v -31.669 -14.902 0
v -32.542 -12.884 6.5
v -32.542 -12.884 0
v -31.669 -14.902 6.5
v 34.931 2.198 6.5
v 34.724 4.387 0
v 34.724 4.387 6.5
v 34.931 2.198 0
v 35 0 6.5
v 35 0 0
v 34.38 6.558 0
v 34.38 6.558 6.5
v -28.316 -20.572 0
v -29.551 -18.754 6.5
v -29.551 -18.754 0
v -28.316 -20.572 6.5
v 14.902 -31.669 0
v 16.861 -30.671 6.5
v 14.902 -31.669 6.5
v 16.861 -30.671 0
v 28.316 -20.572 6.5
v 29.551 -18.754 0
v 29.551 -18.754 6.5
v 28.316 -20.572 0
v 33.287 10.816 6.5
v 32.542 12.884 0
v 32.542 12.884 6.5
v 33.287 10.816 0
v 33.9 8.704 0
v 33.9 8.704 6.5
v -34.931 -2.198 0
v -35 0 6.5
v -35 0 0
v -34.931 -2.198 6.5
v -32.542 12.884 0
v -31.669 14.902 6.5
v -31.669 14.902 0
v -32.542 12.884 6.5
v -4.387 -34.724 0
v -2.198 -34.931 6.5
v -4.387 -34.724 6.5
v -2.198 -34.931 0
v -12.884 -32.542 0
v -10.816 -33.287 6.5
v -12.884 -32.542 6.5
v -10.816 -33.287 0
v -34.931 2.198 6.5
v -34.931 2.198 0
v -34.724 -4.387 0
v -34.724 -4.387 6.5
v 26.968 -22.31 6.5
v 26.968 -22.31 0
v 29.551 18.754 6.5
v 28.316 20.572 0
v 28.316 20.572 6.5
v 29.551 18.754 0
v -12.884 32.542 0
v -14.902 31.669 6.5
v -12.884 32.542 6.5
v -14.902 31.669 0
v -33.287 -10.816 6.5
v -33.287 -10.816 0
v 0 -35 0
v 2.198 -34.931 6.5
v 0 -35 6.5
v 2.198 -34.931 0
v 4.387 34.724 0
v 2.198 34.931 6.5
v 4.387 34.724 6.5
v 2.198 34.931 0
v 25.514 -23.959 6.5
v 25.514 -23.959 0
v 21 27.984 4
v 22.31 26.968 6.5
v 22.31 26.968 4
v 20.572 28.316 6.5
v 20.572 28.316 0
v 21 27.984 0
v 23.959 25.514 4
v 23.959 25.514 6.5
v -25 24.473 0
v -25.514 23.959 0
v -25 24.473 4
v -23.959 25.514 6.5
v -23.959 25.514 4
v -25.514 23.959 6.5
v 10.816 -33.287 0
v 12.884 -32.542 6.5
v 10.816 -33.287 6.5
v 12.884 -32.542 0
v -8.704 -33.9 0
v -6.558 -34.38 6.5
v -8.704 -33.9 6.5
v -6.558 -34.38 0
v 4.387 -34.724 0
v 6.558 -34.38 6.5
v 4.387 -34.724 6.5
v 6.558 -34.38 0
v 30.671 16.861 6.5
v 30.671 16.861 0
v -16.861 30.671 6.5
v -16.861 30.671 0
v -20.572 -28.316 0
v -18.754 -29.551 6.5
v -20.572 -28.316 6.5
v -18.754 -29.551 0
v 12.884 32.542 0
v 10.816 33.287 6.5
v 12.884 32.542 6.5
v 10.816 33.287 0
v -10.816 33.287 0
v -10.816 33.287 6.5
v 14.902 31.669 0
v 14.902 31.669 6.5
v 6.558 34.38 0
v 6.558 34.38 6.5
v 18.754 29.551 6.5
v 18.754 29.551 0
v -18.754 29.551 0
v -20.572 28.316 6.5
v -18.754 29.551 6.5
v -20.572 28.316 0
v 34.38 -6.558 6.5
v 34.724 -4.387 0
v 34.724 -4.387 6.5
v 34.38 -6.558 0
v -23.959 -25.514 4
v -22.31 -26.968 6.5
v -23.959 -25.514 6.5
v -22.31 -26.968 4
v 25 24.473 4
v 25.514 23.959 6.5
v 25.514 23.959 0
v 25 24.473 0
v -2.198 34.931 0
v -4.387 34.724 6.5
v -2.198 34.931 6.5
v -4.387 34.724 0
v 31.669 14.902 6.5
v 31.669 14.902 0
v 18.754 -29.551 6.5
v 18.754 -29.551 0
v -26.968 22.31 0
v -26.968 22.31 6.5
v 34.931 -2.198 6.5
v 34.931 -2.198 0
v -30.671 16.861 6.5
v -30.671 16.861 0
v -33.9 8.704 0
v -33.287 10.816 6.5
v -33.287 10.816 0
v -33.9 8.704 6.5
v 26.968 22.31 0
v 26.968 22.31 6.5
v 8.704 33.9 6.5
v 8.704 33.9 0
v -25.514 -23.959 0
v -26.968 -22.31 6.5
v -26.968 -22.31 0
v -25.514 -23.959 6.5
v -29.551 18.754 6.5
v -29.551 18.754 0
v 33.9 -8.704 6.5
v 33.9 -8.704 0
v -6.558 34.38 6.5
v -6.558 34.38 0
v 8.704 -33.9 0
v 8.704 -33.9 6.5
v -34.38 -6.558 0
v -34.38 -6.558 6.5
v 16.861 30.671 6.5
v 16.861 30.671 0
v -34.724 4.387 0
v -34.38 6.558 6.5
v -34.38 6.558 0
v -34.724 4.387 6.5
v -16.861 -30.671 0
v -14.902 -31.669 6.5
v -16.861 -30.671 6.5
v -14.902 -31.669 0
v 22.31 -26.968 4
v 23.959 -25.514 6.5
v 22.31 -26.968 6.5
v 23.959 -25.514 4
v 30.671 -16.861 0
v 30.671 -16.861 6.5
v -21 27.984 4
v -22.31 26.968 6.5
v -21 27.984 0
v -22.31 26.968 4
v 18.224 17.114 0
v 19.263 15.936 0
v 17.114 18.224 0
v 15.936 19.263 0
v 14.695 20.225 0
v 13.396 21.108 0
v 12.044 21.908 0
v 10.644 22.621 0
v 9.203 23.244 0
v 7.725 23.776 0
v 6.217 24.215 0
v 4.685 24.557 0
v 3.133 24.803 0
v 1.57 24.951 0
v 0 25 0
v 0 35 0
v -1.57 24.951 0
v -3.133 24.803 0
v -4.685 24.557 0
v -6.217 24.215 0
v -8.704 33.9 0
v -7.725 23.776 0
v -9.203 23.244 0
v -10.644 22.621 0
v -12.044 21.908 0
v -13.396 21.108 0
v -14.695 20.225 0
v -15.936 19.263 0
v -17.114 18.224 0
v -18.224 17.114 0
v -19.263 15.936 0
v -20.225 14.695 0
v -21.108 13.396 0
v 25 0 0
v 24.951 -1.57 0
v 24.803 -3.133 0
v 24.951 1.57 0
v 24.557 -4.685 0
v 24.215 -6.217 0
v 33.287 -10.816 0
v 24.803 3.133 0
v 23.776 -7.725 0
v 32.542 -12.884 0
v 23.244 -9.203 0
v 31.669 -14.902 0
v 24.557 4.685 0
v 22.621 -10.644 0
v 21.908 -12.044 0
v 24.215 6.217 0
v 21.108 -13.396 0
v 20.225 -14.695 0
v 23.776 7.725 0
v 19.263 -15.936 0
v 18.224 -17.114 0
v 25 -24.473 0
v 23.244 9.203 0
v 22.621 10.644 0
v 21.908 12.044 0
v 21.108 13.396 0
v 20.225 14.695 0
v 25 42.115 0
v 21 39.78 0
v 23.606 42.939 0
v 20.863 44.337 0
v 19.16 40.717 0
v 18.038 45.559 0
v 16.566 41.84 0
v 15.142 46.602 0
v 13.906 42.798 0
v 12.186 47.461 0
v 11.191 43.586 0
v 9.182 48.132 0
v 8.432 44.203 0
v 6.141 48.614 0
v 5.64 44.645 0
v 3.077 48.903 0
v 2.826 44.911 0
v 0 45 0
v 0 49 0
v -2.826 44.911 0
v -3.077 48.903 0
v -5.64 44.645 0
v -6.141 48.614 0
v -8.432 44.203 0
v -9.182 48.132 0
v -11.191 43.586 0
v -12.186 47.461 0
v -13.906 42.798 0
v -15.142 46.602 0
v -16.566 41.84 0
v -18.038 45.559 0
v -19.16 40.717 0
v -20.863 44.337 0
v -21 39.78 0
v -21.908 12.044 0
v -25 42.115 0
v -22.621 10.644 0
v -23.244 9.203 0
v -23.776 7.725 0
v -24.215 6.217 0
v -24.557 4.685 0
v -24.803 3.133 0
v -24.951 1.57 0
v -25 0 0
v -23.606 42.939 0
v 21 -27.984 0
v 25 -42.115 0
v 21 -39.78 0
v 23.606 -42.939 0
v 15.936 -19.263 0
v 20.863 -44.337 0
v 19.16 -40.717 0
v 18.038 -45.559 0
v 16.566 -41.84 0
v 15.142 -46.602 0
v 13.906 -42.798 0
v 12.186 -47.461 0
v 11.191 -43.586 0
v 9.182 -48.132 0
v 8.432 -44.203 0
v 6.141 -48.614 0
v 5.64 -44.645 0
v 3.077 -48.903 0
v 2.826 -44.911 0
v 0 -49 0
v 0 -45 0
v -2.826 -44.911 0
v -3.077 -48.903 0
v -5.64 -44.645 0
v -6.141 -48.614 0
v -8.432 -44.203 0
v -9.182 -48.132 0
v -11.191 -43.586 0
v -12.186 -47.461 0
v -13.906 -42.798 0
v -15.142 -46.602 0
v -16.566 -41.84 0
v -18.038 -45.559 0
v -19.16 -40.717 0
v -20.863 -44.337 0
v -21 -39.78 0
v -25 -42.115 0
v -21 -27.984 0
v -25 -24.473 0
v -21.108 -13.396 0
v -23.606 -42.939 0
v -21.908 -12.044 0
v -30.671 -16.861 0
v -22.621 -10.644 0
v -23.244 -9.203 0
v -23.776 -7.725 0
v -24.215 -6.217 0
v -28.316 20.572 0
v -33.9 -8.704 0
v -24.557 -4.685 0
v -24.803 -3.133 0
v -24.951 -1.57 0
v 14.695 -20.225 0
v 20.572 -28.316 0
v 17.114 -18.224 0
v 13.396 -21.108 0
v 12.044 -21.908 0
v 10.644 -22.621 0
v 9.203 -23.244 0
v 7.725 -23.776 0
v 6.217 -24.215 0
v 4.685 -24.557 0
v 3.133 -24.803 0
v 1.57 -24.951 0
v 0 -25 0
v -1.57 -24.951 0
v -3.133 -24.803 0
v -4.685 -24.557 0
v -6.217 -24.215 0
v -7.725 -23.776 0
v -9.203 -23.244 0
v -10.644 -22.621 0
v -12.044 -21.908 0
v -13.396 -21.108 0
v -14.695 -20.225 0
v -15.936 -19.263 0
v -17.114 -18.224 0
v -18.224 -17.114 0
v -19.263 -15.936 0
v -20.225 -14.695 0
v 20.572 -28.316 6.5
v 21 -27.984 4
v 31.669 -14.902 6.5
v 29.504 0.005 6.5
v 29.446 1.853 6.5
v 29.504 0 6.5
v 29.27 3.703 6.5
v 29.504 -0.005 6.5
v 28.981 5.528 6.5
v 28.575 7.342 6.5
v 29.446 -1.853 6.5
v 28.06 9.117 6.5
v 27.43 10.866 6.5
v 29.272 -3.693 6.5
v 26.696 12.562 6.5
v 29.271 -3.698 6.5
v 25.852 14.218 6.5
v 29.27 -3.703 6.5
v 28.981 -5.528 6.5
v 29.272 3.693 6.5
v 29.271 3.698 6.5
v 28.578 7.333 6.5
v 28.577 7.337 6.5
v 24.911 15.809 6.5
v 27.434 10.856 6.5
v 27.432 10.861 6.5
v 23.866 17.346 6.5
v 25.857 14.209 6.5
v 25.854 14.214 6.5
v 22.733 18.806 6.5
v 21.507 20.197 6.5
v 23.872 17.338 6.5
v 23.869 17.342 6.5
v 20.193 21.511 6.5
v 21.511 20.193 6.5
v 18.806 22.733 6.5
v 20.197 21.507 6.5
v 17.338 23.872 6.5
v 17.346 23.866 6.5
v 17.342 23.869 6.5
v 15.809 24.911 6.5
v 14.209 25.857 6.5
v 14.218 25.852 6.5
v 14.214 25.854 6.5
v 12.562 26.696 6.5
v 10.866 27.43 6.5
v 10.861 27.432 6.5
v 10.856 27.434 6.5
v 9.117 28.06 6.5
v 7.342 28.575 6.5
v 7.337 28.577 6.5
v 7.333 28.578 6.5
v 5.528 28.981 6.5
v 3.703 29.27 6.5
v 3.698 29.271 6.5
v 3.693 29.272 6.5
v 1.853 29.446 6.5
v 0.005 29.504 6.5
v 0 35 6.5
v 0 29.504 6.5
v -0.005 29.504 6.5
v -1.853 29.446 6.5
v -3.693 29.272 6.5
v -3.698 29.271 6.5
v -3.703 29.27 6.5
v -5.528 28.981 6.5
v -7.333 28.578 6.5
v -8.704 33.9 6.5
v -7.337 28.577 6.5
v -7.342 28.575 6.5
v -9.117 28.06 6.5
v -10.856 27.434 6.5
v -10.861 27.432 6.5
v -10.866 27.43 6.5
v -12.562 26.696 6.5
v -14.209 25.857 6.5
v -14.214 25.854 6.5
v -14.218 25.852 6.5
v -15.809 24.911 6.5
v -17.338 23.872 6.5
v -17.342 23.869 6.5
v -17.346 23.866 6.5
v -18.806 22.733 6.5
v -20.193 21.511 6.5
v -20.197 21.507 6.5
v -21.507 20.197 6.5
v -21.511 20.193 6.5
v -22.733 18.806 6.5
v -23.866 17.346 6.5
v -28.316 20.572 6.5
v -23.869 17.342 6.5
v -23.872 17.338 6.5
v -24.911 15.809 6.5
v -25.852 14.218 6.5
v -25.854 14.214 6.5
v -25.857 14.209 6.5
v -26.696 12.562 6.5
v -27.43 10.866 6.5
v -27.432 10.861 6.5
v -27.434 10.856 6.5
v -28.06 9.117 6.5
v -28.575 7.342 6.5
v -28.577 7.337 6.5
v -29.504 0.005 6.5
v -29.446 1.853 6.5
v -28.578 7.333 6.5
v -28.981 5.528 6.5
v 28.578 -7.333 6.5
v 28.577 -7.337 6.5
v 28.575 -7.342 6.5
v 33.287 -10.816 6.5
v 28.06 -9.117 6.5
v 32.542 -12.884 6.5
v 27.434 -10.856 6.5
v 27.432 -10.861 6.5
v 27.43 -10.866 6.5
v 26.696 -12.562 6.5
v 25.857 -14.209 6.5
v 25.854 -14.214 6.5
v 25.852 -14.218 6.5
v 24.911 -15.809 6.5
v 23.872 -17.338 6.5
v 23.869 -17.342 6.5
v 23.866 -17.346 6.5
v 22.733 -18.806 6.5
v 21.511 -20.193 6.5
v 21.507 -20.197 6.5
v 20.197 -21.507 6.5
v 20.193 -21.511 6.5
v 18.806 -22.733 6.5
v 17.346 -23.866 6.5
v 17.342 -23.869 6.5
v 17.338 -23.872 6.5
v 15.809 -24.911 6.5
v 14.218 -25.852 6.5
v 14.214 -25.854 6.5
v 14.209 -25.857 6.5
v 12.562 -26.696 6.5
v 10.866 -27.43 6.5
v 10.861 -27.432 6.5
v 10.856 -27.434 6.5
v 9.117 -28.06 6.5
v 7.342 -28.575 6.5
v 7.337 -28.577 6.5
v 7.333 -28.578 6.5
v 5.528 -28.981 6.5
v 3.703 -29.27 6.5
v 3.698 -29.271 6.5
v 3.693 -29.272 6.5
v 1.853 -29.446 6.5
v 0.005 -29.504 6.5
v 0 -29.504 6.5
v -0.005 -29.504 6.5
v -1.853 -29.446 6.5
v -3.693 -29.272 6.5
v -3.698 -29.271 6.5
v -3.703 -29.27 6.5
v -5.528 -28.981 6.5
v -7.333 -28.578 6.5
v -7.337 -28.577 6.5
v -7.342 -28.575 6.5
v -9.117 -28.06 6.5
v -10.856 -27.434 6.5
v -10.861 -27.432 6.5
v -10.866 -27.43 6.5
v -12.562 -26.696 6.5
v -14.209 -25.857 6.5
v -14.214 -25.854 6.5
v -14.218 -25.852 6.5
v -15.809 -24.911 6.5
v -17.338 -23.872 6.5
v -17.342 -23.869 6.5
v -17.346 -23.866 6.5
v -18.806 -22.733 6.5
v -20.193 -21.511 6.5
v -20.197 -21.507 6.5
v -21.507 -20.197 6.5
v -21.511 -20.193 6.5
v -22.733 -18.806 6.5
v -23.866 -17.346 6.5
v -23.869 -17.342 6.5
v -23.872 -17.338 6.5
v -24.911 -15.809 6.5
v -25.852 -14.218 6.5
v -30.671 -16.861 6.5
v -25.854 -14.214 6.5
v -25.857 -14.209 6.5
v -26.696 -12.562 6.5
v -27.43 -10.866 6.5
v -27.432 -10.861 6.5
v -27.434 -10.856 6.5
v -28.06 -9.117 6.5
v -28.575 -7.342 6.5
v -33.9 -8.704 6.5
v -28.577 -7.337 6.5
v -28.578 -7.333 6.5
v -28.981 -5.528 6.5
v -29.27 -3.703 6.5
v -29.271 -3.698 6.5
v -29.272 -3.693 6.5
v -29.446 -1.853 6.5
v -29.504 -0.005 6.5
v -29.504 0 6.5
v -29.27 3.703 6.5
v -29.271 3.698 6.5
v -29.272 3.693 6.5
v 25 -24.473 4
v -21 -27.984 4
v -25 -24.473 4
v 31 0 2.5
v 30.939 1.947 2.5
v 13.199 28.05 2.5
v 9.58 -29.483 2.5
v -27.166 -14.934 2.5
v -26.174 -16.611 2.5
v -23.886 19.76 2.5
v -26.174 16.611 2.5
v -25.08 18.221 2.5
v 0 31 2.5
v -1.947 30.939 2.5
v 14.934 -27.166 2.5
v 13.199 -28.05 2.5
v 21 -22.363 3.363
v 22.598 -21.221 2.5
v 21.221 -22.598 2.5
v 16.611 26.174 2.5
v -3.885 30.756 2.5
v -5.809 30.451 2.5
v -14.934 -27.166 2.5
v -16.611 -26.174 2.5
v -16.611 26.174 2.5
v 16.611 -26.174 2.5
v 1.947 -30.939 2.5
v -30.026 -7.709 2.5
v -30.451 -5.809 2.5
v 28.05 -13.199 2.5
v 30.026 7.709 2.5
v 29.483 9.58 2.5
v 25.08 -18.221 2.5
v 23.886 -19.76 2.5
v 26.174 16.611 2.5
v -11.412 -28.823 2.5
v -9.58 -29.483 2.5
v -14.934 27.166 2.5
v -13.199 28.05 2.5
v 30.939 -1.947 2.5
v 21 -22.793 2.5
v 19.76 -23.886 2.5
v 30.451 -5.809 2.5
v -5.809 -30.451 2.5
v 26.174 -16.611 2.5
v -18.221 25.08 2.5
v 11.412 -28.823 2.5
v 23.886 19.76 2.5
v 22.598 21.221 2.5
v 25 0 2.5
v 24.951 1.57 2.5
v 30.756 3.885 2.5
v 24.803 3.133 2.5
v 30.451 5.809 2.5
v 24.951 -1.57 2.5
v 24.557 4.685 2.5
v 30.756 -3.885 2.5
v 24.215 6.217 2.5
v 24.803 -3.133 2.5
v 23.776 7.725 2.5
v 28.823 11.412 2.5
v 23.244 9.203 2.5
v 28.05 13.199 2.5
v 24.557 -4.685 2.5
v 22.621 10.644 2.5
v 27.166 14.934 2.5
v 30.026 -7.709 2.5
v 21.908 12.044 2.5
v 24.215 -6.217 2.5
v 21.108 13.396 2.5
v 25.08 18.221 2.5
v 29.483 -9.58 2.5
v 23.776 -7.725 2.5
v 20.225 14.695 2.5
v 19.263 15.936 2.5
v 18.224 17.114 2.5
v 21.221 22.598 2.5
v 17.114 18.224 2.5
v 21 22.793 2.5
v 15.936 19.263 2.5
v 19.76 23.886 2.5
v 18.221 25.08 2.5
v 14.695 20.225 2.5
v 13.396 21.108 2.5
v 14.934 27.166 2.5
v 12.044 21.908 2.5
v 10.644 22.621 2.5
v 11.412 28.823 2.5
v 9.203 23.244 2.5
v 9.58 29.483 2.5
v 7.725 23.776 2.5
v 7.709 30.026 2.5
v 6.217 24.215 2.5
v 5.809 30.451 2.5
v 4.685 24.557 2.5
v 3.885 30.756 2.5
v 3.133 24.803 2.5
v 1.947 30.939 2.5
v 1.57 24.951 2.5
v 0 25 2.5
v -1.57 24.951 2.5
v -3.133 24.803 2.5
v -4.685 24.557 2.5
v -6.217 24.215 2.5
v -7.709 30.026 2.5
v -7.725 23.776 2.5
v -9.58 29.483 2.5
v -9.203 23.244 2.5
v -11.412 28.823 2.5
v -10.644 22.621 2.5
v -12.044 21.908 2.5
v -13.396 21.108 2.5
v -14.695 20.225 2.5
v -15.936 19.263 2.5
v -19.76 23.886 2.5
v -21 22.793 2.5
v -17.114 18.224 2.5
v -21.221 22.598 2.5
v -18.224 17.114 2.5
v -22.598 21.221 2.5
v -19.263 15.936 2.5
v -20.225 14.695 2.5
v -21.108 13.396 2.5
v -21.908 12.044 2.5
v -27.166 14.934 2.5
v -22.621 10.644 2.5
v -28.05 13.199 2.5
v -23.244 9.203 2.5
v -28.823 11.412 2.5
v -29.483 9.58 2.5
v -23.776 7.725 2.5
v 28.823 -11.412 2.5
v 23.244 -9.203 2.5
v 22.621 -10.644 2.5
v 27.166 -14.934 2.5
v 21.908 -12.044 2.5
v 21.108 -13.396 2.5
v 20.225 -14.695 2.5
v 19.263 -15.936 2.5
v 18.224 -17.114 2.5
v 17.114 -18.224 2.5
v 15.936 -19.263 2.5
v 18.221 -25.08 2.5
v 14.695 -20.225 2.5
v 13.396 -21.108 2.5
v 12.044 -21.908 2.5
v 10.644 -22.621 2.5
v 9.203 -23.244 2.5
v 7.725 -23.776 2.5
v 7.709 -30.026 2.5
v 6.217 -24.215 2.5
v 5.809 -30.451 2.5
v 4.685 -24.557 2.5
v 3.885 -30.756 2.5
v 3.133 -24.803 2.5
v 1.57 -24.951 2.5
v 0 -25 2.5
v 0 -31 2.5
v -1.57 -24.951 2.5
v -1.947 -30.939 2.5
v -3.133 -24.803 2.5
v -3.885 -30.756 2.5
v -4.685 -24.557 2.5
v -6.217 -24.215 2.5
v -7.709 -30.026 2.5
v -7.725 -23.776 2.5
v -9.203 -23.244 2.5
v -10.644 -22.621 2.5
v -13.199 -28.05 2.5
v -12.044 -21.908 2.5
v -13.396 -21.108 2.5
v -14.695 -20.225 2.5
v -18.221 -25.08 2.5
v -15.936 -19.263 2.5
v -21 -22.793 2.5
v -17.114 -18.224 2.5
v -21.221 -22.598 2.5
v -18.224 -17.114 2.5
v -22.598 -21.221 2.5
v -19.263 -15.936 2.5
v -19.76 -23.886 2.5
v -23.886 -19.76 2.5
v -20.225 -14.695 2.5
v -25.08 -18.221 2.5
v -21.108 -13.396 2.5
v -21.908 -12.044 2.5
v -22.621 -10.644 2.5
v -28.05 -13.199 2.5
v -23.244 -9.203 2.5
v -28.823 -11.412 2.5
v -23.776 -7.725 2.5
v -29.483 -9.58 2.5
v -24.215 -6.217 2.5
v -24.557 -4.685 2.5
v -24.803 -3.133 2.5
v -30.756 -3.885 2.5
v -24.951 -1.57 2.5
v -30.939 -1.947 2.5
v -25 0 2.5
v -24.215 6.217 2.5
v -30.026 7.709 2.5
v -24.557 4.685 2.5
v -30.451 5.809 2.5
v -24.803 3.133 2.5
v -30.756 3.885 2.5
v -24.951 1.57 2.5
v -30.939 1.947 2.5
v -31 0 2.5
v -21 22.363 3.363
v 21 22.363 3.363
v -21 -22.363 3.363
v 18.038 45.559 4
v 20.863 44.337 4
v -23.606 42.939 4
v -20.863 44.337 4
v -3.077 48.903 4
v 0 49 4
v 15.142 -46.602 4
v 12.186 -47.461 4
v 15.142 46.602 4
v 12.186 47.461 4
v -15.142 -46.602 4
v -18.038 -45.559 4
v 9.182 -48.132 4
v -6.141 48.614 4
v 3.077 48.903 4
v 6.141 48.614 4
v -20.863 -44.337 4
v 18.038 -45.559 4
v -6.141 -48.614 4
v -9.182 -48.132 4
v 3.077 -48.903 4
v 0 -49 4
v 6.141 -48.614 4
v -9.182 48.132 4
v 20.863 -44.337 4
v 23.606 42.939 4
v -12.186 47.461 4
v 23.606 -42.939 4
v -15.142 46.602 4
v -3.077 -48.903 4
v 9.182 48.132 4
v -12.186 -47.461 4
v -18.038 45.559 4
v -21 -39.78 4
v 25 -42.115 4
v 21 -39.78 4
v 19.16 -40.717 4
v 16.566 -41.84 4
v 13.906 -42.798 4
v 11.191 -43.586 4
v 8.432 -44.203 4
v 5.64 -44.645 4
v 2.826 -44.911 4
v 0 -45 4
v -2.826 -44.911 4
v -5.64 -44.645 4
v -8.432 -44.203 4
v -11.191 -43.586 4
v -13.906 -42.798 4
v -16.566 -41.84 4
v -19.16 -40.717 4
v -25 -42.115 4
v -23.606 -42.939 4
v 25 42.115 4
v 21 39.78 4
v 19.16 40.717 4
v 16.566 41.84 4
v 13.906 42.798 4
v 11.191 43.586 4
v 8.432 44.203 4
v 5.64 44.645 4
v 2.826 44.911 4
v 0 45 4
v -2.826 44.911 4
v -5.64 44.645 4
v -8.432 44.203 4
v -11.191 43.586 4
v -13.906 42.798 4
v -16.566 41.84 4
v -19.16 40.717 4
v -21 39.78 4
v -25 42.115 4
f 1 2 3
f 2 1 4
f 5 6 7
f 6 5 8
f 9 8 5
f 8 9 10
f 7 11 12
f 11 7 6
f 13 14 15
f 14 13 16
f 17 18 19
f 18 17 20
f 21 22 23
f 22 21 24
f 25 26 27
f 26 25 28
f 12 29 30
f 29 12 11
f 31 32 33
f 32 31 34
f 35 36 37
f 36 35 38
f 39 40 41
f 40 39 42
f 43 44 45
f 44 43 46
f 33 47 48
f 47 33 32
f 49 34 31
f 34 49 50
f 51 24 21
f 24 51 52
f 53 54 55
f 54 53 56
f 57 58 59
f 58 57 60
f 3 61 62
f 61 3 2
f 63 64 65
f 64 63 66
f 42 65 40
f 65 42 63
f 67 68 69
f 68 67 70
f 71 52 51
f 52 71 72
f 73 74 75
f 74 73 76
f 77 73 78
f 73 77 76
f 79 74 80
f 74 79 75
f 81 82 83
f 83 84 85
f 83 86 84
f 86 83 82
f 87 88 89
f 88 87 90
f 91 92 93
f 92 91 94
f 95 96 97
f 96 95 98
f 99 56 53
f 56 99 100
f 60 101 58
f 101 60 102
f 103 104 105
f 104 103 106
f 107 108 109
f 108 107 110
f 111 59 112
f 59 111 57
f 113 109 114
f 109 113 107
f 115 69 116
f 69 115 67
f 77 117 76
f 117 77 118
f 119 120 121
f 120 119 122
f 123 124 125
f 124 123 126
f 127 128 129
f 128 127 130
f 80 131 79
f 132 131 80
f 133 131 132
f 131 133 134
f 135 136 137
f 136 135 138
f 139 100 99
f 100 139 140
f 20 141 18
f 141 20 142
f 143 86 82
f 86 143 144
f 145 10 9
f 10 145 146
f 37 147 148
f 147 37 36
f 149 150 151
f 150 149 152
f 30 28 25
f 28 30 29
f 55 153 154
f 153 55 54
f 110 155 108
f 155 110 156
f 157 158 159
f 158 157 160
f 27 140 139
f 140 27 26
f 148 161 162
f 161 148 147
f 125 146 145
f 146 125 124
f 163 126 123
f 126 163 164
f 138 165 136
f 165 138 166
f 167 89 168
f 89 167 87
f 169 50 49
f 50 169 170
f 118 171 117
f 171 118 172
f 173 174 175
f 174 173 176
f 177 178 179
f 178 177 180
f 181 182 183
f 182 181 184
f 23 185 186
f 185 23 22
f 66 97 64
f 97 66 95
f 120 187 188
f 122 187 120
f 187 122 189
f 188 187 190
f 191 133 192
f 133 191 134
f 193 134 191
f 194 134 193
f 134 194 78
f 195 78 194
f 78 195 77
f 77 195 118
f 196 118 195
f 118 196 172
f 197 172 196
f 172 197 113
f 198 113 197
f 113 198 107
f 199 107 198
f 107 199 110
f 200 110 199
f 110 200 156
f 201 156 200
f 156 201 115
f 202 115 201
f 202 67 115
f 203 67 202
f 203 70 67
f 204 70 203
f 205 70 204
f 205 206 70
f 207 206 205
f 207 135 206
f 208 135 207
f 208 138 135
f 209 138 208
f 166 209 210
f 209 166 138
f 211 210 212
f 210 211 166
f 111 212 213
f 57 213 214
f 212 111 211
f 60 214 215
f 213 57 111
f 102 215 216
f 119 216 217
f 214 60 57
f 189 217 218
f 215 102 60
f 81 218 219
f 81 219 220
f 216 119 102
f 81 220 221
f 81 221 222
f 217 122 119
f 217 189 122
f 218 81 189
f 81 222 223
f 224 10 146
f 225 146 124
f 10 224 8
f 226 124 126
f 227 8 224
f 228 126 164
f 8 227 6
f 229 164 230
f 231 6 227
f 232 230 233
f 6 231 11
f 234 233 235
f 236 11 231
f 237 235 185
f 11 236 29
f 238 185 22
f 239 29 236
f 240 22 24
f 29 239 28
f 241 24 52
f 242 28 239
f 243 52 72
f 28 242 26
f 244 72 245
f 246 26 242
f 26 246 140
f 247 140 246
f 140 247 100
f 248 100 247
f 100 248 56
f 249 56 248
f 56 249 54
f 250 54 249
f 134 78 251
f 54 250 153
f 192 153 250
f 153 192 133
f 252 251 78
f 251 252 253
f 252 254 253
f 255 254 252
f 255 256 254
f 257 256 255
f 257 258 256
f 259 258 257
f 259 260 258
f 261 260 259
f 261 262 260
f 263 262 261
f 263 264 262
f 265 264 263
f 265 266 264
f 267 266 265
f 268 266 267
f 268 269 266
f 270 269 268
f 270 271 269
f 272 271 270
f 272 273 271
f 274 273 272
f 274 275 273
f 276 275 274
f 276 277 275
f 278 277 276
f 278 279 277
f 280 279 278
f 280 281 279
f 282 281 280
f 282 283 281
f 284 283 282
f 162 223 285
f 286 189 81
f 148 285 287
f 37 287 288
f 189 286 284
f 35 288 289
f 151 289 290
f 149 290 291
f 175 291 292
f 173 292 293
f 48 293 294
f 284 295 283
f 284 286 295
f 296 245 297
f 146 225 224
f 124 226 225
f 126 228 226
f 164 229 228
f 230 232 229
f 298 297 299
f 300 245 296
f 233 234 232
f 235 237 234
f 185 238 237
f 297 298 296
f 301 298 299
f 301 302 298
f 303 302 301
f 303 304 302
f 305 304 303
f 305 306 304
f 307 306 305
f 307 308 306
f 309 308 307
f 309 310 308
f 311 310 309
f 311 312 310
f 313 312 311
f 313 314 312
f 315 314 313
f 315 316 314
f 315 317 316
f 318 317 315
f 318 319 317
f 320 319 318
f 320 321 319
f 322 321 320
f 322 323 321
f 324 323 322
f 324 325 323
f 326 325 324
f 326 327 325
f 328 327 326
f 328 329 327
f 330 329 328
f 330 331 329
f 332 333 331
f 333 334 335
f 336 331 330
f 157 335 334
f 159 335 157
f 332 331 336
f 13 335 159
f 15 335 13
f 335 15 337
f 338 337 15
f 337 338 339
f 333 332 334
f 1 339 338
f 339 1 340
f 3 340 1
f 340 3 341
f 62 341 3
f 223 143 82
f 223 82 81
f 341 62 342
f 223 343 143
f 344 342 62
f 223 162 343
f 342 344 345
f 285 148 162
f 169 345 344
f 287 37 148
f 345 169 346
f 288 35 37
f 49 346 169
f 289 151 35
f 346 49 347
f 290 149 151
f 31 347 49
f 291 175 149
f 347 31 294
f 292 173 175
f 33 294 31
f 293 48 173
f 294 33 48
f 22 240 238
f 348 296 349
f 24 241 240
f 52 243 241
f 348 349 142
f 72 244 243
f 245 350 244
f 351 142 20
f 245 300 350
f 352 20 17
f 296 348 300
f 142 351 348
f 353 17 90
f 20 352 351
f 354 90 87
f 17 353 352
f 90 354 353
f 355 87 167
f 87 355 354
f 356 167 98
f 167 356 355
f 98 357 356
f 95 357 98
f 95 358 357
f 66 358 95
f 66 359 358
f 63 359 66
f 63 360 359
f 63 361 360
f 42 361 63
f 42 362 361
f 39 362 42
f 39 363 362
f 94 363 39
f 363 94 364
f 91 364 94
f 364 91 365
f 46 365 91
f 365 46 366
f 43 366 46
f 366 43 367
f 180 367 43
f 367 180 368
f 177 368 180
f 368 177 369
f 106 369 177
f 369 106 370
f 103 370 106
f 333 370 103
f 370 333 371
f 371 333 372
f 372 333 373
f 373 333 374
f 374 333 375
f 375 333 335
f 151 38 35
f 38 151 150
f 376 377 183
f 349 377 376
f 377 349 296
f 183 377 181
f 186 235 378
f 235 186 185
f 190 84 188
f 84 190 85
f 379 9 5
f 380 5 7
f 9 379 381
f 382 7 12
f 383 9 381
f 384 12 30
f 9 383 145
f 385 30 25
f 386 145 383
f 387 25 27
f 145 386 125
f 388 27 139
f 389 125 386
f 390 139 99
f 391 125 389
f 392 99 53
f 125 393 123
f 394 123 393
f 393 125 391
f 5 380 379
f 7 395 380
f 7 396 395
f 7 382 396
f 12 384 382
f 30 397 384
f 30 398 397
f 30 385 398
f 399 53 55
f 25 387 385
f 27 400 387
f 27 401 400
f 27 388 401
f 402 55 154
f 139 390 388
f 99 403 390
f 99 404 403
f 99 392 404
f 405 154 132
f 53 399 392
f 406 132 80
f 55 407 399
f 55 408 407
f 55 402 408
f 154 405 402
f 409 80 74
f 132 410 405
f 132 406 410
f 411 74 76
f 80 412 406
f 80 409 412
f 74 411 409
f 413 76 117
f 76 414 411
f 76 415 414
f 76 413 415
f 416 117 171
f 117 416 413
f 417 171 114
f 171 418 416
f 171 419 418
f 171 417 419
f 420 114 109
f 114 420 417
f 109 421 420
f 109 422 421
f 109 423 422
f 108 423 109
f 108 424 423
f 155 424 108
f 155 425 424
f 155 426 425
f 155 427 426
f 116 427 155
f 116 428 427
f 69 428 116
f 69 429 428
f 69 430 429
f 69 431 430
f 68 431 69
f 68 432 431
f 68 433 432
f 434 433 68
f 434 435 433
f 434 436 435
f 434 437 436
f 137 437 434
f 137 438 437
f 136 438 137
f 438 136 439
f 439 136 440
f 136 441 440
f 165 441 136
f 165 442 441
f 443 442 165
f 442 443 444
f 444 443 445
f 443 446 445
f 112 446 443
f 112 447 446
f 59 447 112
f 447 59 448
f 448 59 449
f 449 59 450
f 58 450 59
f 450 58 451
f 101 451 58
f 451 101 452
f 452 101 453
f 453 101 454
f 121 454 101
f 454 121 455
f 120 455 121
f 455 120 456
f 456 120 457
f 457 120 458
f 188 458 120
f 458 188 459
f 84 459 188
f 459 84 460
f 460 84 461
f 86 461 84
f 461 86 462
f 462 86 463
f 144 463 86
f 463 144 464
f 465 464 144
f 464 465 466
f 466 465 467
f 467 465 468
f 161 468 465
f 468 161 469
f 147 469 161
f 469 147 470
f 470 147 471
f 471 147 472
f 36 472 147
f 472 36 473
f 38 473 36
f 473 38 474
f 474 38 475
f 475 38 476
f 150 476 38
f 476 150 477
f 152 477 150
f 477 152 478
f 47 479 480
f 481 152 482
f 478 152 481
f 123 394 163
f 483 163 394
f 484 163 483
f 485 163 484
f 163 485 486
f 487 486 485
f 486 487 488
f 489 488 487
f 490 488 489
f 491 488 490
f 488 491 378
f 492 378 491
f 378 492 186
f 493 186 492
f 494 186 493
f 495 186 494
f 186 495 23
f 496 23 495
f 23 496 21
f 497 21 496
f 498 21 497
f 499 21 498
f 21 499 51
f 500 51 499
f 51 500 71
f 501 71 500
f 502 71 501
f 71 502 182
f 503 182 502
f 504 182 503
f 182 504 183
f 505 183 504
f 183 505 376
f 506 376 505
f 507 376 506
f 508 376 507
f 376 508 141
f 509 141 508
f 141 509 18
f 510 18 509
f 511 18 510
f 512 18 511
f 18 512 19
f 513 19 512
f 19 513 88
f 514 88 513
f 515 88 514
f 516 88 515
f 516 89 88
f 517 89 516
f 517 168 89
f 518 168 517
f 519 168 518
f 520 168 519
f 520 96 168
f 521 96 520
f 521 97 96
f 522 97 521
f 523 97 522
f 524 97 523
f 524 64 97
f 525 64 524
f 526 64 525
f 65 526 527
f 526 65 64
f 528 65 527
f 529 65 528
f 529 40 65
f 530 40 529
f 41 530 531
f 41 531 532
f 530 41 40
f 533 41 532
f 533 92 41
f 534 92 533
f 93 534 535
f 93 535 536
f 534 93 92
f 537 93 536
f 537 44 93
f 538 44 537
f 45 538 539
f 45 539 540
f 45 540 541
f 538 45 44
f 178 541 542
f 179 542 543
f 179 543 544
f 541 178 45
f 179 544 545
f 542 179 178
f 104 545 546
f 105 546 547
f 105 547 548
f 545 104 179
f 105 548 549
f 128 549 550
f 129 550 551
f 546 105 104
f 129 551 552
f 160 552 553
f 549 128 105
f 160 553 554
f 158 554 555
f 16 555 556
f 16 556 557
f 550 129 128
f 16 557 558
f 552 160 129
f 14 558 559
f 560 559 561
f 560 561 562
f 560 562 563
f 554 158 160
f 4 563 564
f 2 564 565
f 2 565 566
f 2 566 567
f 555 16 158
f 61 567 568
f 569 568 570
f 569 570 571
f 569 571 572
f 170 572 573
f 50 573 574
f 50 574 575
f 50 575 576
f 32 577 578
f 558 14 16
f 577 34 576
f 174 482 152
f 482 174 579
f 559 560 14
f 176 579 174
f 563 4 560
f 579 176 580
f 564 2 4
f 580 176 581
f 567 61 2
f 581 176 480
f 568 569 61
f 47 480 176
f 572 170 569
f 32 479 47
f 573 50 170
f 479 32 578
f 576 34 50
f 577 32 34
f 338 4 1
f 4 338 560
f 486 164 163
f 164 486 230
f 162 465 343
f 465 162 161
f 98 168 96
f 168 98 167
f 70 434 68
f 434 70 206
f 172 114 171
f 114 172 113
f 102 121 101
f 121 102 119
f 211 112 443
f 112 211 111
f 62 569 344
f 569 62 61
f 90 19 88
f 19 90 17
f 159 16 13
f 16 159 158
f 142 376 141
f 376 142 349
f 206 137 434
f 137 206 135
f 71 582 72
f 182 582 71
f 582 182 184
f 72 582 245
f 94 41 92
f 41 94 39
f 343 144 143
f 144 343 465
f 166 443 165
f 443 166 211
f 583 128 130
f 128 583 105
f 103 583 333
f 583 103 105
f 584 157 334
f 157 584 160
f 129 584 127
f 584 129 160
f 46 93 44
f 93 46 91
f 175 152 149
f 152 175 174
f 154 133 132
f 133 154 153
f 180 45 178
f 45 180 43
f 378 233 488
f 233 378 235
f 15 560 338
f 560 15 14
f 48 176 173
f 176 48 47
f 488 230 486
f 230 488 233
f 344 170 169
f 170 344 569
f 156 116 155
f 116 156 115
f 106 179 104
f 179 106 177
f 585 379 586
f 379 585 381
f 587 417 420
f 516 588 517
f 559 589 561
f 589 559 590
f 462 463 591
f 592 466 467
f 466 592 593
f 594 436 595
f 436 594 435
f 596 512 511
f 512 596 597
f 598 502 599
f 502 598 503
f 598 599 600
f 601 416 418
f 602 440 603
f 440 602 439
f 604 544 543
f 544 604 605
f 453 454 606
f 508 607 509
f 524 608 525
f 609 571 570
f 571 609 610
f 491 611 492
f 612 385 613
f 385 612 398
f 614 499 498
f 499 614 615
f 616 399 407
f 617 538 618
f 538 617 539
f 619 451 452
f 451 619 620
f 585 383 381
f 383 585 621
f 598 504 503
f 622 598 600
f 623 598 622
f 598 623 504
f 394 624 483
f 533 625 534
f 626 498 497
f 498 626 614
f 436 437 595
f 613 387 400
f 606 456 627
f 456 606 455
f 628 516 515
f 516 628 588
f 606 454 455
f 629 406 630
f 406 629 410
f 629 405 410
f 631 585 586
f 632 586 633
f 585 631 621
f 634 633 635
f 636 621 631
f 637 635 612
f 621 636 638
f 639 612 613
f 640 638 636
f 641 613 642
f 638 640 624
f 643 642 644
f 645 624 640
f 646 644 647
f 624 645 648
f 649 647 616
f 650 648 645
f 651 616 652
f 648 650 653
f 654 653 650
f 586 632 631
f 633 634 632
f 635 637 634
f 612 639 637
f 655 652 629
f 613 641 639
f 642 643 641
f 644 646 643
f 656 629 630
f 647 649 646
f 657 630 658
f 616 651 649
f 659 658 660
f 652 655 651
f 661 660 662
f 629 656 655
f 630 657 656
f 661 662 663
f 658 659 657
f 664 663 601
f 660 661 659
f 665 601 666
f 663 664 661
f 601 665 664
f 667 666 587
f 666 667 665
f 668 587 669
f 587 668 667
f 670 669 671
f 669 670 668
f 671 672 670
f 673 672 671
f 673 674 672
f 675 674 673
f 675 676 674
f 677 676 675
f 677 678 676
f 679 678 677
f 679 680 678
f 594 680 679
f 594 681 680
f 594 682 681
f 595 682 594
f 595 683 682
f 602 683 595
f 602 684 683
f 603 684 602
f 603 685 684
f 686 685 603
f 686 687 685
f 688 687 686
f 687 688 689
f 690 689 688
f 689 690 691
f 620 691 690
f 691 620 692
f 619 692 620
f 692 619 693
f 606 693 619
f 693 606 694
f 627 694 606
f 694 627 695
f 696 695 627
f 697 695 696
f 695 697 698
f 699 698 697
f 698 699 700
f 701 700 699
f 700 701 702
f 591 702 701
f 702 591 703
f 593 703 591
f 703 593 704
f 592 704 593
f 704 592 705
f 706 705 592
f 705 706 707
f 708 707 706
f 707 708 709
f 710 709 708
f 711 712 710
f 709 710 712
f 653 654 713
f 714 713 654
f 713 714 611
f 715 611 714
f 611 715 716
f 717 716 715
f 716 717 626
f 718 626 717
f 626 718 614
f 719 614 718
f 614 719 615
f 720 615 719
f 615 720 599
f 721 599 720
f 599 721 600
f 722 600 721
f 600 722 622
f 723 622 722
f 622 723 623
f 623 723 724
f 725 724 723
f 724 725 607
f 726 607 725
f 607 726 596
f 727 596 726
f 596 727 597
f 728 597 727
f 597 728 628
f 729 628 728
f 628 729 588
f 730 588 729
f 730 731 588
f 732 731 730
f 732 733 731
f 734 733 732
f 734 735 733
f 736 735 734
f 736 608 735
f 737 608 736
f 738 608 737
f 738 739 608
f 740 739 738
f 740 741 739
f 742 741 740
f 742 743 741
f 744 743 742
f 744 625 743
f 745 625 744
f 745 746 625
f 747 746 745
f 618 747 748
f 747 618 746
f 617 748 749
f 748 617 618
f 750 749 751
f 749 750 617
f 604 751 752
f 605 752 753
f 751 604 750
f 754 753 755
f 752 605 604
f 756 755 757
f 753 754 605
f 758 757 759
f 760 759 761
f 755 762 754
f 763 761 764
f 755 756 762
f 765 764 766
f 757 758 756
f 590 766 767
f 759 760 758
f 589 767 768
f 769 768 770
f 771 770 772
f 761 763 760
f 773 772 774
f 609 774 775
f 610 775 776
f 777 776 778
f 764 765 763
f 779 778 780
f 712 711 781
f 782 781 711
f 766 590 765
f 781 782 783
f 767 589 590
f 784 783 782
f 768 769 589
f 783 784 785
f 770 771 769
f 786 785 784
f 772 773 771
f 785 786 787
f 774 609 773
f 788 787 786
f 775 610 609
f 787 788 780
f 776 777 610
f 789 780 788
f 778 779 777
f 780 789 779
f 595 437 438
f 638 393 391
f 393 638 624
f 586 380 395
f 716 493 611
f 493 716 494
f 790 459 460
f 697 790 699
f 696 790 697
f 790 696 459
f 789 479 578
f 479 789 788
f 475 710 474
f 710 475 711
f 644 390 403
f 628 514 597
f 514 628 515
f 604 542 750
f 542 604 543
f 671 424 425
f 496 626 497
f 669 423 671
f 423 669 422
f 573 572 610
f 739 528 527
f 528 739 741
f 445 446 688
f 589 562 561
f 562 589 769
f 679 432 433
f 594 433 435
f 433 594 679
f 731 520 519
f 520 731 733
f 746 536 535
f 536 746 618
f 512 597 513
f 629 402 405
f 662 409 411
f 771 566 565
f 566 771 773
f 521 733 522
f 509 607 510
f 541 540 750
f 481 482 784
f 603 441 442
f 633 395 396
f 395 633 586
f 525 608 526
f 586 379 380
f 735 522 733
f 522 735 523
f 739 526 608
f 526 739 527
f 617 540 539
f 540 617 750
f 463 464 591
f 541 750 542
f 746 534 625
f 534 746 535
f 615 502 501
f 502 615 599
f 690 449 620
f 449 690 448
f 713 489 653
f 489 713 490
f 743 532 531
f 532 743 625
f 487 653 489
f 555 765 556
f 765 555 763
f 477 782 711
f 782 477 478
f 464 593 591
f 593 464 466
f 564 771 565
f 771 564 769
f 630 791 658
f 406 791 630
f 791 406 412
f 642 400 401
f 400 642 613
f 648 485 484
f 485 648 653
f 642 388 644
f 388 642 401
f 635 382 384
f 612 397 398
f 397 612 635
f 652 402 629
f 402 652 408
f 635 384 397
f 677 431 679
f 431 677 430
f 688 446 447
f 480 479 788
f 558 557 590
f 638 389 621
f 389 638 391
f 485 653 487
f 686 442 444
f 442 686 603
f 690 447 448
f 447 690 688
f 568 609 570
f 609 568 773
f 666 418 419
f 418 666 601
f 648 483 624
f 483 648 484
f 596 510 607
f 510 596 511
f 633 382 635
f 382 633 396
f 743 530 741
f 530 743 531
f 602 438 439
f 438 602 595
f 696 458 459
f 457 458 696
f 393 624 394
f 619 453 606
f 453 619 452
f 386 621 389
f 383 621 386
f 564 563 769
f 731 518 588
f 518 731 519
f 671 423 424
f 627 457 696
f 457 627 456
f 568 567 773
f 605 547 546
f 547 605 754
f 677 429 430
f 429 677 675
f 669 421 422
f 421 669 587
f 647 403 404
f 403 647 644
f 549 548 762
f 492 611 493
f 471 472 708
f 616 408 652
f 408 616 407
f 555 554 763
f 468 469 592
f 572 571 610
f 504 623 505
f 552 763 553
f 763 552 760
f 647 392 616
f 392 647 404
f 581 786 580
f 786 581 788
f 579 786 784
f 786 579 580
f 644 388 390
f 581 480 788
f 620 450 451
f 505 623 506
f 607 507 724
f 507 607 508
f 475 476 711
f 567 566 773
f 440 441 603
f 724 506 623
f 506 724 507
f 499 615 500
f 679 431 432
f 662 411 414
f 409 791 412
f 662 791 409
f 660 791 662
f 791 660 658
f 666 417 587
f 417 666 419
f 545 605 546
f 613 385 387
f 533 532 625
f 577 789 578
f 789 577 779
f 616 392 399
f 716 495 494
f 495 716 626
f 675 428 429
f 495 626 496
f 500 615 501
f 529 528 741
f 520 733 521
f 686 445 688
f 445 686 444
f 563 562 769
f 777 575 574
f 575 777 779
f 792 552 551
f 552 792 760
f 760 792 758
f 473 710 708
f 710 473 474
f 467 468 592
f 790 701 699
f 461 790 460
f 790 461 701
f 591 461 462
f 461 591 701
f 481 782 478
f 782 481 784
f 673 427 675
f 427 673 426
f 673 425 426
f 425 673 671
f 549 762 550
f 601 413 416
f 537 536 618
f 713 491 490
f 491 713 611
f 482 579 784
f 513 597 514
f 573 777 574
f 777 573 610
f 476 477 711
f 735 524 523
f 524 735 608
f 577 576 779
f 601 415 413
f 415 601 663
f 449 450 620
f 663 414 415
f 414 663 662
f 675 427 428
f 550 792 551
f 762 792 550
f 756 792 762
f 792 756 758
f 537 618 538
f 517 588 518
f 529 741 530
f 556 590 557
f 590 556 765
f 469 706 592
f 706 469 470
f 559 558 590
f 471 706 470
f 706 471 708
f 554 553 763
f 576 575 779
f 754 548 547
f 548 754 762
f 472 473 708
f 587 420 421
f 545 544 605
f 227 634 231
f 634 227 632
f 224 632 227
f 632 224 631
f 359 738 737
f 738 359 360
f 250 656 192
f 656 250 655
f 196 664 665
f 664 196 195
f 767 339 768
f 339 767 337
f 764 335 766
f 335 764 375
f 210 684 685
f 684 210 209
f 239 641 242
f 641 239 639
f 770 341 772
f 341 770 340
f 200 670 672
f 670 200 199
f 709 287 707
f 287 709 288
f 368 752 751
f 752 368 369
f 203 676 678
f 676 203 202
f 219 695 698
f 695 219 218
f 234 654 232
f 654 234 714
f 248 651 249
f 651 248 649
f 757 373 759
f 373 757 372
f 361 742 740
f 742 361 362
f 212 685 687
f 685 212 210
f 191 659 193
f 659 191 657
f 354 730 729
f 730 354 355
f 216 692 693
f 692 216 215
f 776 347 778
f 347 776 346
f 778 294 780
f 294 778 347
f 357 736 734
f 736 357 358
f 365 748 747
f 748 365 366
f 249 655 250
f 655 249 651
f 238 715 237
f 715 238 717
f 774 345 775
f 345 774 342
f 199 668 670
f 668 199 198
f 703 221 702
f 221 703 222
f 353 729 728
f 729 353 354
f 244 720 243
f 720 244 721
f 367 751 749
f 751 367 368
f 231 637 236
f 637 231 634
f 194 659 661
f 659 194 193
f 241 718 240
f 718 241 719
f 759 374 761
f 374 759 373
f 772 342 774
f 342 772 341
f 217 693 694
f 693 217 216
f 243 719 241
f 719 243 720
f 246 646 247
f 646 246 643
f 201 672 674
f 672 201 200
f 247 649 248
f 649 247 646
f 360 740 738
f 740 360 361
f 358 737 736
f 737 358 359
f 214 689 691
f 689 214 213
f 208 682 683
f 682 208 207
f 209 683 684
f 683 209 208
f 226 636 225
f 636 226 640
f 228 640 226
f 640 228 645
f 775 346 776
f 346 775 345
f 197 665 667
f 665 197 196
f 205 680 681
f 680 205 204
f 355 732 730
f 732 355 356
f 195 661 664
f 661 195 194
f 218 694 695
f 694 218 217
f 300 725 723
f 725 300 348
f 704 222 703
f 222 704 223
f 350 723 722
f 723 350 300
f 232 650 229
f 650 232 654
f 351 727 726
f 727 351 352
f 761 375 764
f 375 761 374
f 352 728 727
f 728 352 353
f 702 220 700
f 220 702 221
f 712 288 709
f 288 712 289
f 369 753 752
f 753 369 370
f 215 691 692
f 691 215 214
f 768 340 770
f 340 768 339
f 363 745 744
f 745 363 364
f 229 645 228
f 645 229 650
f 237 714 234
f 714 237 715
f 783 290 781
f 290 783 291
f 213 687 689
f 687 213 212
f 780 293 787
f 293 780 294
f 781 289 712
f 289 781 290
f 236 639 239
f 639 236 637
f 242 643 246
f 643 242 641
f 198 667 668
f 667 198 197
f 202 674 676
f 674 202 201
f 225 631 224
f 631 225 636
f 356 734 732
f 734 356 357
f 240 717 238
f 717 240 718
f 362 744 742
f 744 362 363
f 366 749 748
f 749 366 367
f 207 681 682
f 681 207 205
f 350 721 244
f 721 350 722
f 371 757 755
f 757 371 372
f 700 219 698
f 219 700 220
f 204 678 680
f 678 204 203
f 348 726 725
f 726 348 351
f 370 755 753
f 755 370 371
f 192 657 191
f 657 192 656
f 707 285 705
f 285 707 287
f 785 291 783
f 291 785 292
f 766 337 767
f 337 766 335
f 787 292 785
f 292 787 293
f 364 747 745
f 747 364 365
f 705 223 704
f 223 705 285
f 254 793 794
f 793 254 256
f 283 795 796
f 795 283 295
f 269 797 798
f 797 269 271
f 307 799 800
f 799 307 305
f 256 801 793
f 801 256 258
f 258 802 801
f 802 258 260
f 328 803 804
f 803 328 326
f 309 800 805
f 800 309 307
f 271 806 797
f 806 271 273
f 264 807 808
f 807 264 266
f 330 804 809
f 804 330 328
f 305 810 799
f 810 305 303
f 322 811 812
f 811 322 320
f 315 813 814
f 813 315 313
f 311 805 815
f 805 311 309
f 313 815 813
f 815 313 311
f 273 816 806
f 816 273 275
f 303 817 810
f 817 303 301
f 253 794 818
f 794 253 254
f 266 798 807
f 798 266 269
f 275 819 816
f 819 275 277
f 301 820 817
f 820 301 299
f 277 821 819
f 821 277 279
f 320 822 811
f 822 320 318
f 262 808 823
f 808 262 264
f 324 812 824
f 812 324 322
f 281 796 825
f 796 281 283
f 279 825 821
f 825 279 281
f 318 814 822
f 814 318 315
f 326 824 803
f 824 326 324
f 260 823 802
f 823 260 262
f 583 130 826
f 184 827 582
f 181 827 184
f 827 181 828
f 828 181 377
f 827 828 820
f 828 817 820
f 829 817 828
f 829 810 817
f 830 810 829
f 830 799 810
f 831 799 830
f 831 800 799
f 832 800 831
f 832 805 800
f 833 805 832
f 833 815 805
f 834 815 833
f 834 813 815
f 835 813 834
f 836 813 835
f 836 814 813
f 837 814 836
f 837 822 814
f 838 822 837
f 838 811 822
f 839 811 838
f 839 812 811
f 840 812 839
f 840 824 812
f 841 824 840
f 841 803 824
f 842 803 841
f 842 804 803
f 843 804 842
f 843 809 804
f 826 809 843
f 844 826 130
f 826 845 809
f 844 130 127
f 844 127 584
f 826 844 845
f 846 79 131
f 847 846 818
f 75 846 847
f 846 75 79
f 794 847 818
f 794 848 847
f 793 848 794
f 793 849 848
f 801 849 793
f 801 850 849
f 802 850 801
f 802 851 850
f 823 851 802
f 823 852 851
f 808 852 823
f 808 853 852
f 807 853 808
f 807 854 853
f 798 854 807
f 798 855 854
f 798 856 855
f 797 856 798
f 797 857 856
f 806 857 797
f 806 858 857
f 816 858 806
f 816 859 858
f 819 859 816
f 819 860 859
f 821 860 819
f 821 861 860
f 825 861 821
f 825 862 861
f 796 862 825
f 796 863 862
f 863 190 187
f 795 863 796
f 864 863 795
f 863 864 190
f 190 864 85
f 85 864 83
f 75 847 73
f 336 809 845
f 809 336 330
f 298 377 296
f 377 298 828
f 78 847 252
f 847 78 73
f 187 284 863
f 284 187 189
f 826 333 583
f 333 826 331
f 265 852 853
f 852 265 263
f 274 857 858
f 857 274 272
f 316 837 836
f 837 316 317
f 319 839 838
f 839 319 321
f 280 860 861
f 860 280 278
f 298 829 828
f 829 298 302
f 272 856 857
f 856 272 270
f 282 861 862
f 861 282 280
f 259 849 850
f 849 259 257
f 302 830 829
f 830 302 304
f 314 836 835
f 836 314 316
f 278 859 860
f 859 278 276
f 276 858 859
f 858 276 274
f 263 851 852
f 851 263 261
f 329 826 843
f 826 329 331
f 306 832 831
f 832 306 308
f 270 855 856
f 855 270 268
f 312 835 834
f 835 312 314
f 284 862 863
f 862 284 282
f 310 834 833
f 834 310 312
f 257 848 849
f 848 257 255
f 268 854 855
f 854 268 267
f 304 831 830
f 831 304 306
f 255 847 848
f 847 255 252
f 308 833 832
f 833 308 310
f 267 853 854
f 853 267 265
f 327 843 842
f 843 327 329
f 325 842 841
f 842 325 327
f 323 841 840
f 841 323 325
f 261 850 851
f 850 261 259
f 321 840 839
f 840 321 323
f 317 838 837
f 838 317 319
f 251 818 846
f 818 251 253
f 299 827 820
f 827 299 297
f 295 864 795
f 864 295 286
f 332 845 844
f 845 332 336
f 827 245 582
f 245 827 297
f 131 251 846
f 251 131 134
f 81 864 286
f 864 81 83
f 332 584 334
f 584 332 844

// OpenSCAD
//CUSTOMIZER VARIABLES

//Facet number
definition = 100; // [0:400]

//Height of the lens cap holder
baseheight = 6.5;

//Amount of plastic around the lens cap
basewidth = 6;

//Width of the hole in the base of the lens cap holder
basehole = 50;

//Width of your lens cap
capwidth = 58;

//Width to be added to the bottom of the lens cap hole, creates an angle (useful for making sure the cap holds)
captilt = 1.5;

//Height of the cutout for the lens cap
capheight = 4;

//tolerance setting for the lens cap hole (1-2mm should be enough for most printers)
captolerance = 1;

//Gap between the strap holder and the base of the cap holder
beltlength = 10;

//Width of your camera's neck strap
beltwidth = 42;

//Height of the strap holder
beltheight = 4;

//Thickness of the strap holder
beltthickness = 4;

$fn = definition;

difference(){

	cylinder(baseheight,basewidth+capwidth/2,basewidth+capwidth/2);

	translate([0,0,baseheight-capheight])cylinder(capheight+0.01,capwidth/2+captolerance/2+captilt,capwidth/2+captolerance/2);

	translate([0,0,-0.5])cylinder(baseheight-capheight+1,basehole/2,basehole/2);

};

difference(){
	
	intersection(){
		
		cylinder(beltheight,beltlength+basewidth+capwidth/2+beltthickness,beltlength+basewidth+capwidth/2+beltthickness);
		
		translate([-beltwidth/2,-(beltlength*2+basewidth*2+capwidth+beltthickness*2+5)/2,-0.5])cube([beltwidth,beltlength*2+basewidth*2+capwidth+beltthickness*2+5,beltheight+1]);
		
	};
	
	translate([0,0,baseheight-capheight])cylinder(capheight+0.01,capwidth/2+captolerance/2+captilt,capwidth/2+captolerance/2);

	translate([0,0,-0.5])cylinder(baseheight-capheight+1,basehole/2,basehole/2);
	
	translate([0,0,-0.5])cylinder(beltheight+1,beltlength+basewidth+capwidth/2,beltlength+basewidth+capwidth/2);
	
};

difference(){
	
	intersection(){
		
		cylinder(beltheight,beltlength+basewidth+capwidth/2+beltthickness,beltlength+basewidth+capwidth/2+beltthickness);
		
		translate([-(beltwidth/2+beltthickness),-(beltlength*2+basewidth*2+capwidth+beltthickness*2+5)/2,-0.5])cube([beltwidth+beltthickness*2,beltlength*2+basewidth*2+capwidth+beltthickness*2+5,beltheight+1]);
		
	};
	
	translate([-beltwidth/2,-(beltlength*2+basewidth*2+capwidth+beltthickness*2+5)/2,-0.5])cube([beltwidth,beltlength*2+basewidth*2+capwidth+beltthickness*2+5,beltheight+1]);
	
	translate([0,0,baseheight-capheight])cylinder(capheight+0.01,capwidth/2+captolerance/2+captilt,capwidth/2+captolerance/2);

	translate([0,0,-0.5])cylinder(baseheight-capheight+1,basehole/2,basehole/2);
	
};
